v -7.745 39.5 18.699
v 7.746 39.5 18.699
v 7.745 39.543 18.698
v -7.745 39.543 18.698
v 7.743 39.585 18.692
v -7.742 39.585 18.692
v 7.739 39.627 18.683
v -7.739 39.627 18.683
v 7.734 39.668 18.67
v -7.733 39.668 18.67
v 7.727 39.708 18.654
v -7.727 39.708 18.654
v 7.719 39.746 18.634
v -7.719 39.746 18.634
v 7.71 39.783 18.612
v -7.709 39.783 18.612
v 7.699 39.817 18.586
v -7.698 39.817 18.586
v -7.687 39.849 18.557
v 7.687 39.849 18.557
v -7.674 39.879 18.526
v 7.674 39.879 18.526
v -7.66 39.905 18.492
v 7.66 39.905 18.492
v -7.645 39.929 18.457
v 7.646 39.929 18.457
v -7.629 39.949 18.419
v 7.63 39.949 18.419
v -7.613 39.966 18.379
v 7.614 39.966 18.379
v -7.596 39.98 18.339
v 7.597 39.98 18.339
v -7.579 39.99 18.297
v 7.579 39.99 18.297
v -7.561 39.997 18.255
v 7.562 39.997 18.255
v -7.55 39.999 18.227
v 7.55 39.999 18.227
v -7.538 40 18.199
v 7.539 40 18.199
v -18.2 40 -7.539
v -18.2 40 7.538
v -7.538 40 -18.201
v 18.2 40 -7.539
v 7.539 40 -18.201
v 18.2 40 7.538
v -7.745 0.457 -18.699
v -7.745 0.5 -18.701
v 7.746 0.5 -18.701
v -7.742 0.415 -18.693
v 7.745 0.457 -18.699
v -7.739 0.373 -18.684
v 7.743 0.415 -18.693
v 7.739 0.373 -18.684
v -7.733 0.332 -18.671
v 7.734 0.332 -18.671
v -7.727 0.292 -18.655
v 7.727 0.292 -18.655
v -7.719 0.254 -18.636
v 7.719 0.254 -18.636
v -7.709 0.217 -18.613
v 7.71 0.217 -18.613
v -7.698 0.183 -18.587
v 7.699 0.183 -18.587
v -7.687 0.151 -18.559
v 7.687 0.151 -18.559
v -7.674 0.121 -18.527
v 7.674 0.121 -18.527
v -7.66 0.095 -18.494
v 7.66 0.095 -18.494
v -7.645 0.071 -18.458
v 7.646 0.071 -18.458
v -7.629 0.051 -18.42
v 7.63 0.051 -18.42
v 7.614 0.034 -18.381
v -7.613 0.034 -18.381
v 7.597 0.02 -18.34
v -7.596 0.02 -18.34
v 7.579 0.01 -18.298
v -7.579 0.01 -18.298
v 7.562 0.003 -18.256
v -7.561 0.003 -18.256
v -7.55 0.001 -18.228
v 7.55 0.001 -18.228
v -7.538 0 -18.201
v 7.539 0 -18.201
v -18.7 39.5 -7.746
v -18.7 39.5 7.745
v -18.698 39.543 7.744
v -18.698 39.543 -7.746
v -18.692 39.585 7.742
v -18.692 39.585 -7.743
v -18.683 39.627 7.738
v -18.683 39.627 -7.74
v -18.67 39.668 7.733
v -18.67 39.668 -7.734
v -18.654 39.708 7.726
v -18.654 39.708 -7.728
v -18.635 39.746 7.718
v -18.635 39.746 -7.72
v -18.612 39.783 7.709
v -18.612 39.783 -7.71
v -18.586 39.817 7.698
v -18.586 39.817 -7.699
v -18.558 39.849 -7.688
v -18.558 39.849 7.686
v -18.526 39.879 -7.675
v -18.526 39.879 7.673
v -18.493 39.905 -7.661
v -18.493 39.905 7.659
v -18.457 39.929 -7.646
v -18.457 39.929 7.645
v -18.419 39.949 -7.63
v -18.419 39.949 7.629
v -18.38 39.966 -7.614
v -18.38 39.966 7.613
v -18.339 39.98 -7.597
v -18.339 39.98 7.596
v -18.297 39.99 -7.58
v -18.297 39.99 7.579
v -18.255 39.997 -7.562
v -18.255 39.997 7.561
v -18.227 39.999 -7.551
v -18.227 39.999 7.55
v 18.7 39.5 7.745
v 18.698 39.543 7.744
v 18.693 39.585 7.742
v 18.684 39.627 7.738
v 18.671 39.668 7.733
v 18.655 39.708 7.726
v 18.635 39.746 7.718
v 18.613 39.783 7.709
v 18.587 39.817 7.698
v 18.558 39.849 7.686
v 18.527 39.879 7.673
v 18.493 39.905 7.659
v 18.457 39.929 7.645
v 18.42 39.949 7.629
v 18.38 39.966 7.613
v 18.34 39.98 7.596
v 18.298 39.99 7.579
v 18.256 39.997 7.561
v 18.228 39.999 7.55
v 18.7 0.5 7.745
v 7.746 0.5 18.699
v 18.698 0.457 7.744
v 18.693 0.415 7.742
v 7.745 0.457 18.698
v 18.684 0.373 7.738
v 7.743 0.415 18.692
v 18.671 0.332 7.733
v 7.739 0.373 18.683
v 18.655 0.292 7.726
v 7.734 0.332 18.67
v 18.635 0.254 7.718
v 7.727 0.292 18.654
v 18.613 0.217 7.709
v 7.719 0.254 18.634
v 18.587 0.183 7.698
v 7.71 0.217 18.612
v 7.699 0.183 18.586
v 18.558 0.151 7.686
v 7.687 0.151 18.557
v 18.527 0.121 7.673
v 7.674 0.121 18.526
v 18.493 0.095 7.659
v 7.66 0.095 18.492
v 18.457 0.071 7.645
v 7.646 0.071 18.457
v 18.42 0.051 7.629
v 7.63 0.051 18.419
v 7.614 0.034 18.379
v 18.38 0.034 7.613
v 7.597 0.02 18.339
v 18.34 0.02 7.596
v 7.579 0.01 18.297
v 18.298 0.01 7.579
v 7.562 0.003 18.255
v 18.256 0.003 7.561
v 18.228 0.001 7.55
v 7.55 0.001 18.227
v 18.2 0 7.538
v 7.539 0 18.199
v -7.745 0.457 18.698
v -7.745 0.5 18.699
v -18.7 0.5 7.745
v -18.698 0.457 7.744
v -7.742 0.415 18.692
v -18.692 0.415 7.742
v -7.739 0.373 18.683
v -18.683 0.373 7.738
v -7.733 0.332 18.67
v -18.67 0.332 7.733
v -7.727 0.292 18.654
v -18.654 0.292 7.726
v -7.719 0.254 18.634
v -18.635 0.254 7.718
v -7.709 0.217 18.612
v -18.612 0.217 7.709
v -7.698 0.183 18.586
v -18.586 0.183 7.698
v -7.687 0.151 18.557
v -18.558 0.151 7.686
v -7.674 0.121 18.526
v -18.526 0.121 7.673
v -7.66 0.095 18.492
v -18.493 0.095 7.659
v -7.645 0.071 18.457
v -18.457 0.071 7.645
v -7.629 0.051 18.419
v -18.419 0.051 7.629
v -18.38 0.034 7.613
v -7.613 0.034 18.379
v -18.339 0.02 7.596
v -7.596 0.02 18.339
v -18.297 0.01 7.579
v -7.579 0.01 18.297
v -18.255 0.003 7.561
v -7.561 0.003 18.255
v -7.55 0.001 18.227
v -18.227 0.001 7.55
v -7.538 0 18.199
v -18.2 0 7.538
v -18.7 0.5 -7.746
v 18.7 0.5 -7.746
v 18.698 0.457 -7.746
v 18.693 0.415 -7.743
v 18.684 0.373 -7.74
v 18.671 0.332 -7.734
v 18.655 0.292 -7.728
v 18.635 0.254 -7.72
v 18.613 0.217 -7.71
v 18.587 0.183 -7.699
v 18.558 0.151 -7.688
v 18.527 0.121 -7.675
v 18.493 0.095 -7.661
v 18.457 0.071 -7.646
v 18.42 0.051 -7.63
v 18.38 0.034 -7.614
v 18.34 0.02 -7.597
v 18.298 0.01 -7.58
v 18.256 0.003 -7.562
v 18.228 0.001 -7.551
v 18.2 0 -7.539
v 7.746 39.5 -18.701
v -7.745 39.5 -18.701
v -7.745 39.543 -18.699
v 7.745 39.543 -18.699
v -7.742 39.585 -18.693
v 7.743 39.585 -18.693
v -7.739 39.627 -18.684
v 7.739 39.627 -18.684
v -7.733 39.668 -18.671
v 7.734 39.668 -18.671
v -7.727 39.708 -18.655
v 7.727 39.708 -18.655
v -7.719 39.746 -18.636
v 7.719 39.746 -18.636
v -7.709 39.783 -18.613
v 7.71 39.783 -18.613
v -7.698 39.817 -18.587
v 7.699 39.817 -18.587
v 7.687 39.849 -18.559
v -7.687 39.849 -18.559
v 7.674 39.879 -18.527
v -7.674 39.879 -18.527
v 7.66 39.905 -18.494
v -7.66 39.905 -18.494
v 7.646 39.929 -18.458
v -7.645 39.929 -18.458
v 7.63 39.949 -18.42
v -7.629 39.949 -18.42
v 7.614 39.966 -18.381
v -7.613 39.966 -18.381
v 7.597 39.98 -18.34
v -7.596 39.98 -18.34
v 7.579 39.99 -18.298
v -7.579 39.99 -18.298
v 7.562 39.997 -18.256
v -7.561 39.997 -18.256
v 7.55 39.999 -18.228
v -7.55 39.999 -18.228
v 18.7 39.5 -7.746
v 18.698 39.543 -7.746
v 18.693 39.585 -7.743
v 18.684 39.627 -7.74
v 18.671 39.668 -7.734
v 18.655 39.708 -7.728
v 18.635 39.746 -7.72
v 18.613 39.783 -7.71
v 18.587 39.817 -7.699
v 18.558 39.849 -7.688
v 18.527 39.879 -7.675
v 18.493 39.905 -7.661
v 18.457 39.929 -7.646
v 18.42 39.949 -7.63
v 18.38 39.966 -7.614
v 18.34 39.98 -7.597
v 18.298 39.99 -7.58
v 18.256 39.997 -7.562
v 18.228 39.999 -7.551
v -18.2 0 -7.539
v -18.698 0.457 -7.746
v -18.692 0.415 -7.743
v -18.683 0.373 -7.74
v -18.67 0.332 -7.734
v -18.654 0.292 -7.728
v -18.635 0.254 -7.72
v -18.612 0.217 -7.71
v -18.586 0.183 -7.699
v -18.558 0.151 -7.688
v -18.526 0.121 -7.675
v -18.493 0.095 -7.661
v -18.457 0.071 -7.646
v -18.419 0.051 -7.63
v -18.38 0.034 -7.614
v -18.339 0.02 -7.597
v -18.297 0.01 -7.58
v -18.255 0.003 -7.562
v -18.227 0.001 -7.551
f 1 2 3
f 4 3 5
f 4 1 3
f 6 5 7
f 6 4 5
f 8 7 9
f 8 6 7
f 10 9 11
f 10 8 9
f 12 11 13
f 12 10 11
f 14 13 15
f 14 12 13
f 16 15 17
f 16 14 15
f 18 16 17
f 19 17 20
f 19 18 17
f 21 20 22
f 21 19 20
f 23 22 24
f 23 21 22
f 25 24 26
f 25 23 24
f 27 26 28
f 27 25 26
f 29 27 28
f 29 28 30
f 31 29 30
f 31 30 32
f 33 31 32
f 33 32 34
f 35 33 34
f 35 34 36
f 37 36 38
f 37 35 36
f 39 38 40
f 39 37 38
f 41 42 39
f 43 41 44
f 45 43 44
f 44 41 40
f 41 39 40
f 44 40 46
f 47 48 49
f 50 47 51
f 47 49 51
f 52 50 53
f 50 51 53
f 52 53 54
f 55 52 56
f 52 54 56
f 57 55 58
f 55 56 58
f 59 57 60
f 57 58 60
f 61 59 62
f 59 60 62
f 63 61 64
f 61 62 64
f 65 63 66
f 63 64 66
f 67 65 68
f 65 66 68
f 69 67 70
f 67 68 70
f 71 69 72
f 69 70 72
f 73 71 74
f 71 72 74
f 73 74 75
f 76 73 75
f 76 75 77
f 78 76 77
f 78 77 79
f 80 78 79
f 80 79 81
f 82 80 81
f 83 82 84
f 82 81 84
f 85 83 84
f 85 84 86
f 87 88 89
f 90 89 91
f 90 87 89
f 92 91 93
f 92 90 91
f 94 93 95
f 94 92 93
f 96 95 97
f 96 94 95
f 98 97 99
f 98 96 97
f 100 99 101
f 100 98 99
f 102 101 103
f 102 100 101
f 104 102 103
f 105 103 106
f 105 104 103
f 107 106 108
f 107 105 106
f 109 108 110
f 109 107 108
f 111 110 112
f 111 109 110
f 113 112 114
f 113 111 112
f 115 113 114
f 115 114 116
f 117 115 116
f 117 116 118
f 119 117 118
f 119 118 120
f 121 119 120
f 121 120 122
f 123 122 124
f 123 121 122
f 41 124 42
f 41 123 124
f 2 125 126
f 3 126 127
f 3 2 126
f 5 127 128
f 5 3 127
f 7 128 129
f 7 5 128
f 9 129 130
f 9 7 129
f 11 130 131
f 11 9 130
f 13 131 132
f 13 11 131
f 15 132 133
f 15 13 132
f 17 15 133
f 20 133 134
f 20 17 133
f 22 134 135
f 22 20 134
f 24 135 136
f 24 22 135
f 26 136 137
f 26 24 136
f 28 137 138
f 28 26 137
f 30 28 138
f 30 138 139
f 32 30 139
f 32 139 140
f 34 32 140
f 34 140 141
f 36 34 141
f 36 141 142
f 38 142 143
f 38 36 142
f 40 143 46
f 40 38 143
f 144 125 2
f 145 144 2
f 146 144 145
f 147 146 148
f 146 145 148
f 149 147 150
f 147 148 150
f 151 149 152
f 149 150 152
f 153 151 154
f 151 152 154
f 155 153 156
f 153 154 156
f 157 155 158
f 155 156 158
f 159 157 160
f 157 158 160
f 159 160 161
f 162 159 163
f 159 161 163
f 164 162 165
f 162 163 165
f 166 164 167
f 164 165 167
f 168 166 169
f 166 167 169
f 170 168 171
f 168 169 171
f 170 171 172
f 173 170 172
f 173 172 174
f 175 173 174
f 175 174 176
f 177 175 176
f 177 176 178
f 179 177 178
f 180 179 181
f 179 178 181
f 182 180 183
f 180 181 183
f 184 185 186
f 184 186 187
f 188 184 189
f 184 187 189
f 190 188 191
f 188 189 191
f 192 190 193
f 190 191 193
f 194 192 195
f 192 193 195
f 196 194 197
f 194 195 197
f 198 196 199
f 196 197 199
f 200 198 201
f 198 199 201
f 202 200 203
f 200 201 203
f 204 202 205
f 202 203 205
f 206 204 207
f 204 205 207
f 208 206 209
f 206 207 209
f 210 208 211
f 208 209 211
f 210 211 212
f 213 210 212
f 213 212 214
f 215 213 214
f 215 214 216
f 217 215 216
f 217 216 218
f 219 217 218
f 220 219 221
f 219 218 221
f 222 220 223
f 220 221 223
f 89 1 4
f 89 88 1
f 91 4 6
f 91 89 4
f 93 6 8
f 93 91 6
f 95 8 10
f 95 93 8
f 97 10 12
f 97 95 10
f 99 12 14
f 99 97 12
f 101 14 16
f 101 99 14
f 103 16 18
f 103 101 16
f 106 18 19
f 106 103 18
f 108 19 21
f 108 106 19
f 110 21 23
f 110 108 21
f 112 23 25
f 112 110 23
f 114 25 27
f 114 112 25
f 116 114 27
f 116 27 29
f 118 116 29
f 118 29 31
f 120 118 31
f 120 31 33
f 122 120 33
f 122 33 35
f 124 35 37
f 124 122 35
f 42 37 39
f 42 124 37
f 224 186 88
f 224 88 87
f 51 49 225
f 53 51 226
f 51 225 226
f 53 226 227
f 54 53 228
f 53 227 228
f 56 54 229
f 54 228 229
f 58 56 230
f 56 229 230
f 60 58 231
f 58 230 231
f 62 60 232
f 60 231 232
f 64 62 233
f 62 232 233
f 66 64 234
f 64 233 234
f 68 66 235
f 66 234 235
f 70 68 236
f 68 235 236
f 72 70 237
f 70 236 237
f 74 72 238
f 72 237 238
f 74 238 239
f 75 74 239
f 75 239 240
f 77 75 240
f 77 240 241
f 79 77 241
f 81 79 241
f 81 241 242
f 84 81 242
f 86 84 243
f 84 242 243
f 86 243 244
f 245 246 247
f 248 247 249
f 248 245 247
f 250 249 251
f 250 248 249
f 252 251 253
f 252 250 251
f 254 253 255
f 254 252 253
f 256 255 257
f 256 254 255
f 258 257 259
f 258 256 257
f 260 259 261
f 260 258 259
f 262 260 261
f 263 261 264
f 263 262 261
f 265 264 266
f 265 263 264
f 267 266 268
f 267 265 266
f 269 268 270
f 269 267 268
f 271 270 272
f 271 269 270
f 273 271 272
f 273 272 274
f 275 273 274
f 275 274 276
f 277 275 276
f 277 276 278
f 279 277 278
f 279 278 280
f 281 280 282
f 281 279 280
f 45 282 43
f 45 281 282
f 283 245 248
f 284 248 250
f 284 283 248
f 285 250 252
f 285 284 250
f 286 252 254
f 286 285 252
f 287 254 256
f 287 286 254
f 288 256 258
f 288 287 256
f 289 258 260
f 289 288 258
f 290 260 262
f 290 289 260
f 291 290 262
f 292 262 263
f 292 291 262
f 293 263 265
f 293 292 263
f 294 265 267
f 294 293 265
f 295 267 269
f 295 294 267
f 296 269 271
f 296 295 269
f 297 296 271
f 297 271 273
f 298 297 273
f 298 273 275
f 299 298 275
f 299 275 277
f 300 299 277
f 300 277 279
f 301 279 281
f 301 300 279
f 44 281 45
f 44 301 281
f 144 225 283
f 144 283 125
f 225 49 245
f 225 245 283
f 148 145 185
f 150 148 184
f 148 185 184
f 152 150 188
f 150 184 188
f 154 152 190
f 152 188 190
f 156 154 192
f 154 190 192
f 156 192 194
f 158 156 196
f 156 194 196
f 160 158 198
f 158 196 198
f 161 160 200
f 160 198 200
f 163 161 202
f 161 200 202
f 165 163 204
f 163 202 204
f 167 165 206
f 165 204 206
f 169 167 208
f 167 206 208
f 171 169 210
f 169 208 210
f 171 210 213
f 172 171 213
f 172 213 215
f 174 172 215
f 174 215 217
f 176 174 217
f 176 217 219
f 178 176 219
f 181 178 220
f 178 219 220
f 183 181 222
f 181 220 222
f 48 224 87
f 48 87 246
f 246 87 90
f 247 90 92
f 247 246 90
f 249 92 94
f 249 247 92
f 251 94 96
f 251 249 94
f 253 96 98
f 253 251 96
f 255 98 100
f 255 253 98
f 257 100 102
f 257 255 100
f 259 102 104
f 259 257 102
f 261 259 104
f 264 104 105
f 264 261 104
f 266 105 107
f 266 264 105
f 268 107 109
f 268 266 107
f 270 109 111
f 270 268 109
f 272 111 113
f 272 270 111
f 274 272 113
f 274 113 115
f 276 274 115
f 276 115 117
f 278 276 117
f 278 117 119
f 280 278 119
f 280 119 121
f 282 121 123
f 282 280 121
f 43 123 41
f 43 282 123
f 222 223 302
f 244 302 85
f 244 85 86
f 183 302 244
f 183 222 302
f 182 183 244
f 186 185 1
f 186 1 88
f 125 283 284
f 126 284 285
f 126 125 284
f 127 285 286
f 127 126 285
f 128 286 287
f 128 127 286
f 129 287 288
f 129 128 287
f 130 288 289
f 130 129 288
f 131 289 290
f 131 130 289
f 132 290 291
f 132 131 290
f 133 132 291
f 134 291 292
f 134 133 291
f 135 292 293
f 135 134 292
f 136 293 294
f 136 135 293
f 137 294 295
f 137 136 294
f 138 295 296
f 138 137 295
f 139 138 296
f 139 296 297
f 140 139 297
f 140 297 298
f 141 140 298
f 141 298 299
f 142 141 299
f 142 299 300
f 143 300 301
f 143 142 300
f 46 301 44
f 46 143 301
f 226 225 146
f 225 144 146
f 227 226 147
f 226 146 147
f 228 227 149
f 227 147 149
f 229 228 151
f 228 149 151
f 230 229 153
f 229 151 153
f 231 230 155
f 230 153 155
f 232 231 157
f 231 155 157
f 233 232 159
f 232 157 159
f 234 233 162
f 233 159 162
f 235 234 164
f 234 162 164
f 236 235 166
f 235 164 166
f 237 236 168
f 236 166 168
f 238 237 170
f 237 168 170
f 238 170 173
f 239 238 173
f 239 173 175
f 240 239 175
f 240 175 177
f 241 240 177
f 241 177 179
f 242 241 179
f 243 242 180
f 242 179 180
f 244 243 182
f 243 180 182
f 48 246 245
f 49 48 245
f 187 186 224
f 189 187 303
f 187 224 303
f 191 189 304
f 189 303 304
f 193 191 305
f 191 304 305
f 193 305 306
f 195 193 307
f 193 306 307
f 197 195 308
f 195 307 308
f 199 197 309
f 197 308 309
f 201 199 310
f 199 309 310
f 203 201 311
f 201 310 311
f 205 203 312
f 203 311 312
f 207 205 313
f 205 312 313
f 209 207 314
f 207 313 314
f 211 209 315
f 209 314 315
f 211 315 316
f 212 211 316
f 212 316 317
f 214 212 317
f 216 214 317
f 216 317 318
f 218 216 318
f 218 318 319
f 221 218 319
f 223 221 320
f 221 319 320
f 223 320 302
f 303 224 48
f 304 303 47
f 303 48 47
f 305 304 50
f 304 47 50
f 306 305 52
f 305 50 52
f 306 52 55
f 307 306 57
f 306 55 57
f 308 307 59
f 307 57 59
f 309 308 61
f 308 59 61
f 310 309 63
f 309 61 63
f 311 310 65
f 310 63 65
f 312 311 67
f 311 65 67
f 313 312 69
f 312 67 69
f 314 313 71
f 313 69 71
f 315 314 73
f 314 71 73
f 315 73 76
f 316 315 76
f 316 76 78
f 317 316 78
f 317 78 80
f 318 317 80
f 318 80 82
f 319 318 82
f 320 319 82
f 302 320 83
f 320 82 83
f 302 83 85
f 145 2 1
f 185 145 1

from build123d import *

# Parameters (mm, degrees)
BOSS_EXTRUDE1_DEPTH = 40
FILLET1_R           = 0.5


with BuildPart() as part:
    # Sketch1 → Boss-Extrude1 (new body)
    with BuildSketch(Plane(origin=(0, 0, 0), x_dir=(-1, 0, 0), z_dir=(0, 1, 0))):
        Polygon((7.745479892, -18.700646836), (-7.74610734, -18.700646836), (-18.700313724, -7.746440452), (-18.700313724, 7.745146781), (-7.74610734, 18.699353164), (7.745479892, 18.699353164), (18.699686276, 7.745146781), (18.699686276, -7.746440452), align=None)
    extrude(amount=BOSS_EXTRUDE1_DEPTH)

    # Fillet1
    fillet1_edges = [part.edges().sort_by_distance(p)[0] for p in [
        (0.000313724, 0, 18.699353164),
        (-13.222583084, 0, 13.222249973),
        (-18.699686276, 0, -0.000646836),
        (-13.222583084, 0, -13.223543644),
        (-13.222583084, 40, 13.222249973),
        (0.000313724, 40, 18.699353164),
        (13.223210532, 40, 13.222249973),
        (18.700313724, 40, -0.000646836),
        (13.223210532, 40, -13.223543644),
        (0.000313724, 40, -18.700646836),
        (-13.222583084, 40, -13.223543644),
        (0.000313724, 0, -18.700646836),
        (-18.699686276, 40, -0.000646836),
        (13.223210532, 0, -13.223543644),
        (18.700313724, 0, -0.000646836),
        (13.223210532, 0, 13.222249973),
    ]]
    fillet(fillet1_edges, radius=FILLET1_R)


solid = part.part
